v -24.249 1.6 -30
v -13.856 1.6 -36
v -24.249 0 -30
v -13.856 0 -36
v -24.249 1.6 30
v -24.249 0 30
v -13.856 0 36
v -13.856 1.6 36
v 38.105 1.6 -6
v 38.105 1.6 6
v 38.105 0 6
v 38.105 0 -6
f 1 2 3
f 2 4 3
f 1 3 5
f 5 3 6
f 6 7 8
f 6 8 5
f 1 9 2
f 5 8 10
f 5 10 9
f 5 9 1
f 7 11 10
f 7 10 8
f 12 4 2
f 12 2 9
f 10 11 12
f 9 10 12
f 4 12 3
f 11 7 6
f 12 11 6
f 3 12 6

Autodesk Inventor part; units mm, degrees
ref_plane "YZ Plane" through (0, 0, 0) normal (1, 0, 0) x (0, 1, 0)
ref_plane "XZ Plane" through (0, 0, 0) normal (0, 1, 0) x (-1, 0, 0)
ref_plane "XY Plane" through (0, 0, 0) normal (0, 0, 1) x (1, 0, 0)
sketch "Sketch2" plane through (0, 0, 0) normal (0, 1, 0) x (-1, 0, 0)
  line L0 (-38.1051, 6) -> (13.8564, 36)
  line L1 (-38.1051, 6) -> (-38.1051, -6)
  line L2 (13.8564, -36) -> (-38.1051, -6)
  line L3 (13.8564, -36) -> (24.2487, -30)
  line L4 (24.2487, -30) -> (24.2487, 30)
  line L5 (13.8564, 36) -> (24.2487, 30)
  point P0 (0, 0)
  point P1 (0, 0)
extrude "Extrusion1" add sketch "Sketch2" along normal blind 1.6
properties part number "PCB_Top"
